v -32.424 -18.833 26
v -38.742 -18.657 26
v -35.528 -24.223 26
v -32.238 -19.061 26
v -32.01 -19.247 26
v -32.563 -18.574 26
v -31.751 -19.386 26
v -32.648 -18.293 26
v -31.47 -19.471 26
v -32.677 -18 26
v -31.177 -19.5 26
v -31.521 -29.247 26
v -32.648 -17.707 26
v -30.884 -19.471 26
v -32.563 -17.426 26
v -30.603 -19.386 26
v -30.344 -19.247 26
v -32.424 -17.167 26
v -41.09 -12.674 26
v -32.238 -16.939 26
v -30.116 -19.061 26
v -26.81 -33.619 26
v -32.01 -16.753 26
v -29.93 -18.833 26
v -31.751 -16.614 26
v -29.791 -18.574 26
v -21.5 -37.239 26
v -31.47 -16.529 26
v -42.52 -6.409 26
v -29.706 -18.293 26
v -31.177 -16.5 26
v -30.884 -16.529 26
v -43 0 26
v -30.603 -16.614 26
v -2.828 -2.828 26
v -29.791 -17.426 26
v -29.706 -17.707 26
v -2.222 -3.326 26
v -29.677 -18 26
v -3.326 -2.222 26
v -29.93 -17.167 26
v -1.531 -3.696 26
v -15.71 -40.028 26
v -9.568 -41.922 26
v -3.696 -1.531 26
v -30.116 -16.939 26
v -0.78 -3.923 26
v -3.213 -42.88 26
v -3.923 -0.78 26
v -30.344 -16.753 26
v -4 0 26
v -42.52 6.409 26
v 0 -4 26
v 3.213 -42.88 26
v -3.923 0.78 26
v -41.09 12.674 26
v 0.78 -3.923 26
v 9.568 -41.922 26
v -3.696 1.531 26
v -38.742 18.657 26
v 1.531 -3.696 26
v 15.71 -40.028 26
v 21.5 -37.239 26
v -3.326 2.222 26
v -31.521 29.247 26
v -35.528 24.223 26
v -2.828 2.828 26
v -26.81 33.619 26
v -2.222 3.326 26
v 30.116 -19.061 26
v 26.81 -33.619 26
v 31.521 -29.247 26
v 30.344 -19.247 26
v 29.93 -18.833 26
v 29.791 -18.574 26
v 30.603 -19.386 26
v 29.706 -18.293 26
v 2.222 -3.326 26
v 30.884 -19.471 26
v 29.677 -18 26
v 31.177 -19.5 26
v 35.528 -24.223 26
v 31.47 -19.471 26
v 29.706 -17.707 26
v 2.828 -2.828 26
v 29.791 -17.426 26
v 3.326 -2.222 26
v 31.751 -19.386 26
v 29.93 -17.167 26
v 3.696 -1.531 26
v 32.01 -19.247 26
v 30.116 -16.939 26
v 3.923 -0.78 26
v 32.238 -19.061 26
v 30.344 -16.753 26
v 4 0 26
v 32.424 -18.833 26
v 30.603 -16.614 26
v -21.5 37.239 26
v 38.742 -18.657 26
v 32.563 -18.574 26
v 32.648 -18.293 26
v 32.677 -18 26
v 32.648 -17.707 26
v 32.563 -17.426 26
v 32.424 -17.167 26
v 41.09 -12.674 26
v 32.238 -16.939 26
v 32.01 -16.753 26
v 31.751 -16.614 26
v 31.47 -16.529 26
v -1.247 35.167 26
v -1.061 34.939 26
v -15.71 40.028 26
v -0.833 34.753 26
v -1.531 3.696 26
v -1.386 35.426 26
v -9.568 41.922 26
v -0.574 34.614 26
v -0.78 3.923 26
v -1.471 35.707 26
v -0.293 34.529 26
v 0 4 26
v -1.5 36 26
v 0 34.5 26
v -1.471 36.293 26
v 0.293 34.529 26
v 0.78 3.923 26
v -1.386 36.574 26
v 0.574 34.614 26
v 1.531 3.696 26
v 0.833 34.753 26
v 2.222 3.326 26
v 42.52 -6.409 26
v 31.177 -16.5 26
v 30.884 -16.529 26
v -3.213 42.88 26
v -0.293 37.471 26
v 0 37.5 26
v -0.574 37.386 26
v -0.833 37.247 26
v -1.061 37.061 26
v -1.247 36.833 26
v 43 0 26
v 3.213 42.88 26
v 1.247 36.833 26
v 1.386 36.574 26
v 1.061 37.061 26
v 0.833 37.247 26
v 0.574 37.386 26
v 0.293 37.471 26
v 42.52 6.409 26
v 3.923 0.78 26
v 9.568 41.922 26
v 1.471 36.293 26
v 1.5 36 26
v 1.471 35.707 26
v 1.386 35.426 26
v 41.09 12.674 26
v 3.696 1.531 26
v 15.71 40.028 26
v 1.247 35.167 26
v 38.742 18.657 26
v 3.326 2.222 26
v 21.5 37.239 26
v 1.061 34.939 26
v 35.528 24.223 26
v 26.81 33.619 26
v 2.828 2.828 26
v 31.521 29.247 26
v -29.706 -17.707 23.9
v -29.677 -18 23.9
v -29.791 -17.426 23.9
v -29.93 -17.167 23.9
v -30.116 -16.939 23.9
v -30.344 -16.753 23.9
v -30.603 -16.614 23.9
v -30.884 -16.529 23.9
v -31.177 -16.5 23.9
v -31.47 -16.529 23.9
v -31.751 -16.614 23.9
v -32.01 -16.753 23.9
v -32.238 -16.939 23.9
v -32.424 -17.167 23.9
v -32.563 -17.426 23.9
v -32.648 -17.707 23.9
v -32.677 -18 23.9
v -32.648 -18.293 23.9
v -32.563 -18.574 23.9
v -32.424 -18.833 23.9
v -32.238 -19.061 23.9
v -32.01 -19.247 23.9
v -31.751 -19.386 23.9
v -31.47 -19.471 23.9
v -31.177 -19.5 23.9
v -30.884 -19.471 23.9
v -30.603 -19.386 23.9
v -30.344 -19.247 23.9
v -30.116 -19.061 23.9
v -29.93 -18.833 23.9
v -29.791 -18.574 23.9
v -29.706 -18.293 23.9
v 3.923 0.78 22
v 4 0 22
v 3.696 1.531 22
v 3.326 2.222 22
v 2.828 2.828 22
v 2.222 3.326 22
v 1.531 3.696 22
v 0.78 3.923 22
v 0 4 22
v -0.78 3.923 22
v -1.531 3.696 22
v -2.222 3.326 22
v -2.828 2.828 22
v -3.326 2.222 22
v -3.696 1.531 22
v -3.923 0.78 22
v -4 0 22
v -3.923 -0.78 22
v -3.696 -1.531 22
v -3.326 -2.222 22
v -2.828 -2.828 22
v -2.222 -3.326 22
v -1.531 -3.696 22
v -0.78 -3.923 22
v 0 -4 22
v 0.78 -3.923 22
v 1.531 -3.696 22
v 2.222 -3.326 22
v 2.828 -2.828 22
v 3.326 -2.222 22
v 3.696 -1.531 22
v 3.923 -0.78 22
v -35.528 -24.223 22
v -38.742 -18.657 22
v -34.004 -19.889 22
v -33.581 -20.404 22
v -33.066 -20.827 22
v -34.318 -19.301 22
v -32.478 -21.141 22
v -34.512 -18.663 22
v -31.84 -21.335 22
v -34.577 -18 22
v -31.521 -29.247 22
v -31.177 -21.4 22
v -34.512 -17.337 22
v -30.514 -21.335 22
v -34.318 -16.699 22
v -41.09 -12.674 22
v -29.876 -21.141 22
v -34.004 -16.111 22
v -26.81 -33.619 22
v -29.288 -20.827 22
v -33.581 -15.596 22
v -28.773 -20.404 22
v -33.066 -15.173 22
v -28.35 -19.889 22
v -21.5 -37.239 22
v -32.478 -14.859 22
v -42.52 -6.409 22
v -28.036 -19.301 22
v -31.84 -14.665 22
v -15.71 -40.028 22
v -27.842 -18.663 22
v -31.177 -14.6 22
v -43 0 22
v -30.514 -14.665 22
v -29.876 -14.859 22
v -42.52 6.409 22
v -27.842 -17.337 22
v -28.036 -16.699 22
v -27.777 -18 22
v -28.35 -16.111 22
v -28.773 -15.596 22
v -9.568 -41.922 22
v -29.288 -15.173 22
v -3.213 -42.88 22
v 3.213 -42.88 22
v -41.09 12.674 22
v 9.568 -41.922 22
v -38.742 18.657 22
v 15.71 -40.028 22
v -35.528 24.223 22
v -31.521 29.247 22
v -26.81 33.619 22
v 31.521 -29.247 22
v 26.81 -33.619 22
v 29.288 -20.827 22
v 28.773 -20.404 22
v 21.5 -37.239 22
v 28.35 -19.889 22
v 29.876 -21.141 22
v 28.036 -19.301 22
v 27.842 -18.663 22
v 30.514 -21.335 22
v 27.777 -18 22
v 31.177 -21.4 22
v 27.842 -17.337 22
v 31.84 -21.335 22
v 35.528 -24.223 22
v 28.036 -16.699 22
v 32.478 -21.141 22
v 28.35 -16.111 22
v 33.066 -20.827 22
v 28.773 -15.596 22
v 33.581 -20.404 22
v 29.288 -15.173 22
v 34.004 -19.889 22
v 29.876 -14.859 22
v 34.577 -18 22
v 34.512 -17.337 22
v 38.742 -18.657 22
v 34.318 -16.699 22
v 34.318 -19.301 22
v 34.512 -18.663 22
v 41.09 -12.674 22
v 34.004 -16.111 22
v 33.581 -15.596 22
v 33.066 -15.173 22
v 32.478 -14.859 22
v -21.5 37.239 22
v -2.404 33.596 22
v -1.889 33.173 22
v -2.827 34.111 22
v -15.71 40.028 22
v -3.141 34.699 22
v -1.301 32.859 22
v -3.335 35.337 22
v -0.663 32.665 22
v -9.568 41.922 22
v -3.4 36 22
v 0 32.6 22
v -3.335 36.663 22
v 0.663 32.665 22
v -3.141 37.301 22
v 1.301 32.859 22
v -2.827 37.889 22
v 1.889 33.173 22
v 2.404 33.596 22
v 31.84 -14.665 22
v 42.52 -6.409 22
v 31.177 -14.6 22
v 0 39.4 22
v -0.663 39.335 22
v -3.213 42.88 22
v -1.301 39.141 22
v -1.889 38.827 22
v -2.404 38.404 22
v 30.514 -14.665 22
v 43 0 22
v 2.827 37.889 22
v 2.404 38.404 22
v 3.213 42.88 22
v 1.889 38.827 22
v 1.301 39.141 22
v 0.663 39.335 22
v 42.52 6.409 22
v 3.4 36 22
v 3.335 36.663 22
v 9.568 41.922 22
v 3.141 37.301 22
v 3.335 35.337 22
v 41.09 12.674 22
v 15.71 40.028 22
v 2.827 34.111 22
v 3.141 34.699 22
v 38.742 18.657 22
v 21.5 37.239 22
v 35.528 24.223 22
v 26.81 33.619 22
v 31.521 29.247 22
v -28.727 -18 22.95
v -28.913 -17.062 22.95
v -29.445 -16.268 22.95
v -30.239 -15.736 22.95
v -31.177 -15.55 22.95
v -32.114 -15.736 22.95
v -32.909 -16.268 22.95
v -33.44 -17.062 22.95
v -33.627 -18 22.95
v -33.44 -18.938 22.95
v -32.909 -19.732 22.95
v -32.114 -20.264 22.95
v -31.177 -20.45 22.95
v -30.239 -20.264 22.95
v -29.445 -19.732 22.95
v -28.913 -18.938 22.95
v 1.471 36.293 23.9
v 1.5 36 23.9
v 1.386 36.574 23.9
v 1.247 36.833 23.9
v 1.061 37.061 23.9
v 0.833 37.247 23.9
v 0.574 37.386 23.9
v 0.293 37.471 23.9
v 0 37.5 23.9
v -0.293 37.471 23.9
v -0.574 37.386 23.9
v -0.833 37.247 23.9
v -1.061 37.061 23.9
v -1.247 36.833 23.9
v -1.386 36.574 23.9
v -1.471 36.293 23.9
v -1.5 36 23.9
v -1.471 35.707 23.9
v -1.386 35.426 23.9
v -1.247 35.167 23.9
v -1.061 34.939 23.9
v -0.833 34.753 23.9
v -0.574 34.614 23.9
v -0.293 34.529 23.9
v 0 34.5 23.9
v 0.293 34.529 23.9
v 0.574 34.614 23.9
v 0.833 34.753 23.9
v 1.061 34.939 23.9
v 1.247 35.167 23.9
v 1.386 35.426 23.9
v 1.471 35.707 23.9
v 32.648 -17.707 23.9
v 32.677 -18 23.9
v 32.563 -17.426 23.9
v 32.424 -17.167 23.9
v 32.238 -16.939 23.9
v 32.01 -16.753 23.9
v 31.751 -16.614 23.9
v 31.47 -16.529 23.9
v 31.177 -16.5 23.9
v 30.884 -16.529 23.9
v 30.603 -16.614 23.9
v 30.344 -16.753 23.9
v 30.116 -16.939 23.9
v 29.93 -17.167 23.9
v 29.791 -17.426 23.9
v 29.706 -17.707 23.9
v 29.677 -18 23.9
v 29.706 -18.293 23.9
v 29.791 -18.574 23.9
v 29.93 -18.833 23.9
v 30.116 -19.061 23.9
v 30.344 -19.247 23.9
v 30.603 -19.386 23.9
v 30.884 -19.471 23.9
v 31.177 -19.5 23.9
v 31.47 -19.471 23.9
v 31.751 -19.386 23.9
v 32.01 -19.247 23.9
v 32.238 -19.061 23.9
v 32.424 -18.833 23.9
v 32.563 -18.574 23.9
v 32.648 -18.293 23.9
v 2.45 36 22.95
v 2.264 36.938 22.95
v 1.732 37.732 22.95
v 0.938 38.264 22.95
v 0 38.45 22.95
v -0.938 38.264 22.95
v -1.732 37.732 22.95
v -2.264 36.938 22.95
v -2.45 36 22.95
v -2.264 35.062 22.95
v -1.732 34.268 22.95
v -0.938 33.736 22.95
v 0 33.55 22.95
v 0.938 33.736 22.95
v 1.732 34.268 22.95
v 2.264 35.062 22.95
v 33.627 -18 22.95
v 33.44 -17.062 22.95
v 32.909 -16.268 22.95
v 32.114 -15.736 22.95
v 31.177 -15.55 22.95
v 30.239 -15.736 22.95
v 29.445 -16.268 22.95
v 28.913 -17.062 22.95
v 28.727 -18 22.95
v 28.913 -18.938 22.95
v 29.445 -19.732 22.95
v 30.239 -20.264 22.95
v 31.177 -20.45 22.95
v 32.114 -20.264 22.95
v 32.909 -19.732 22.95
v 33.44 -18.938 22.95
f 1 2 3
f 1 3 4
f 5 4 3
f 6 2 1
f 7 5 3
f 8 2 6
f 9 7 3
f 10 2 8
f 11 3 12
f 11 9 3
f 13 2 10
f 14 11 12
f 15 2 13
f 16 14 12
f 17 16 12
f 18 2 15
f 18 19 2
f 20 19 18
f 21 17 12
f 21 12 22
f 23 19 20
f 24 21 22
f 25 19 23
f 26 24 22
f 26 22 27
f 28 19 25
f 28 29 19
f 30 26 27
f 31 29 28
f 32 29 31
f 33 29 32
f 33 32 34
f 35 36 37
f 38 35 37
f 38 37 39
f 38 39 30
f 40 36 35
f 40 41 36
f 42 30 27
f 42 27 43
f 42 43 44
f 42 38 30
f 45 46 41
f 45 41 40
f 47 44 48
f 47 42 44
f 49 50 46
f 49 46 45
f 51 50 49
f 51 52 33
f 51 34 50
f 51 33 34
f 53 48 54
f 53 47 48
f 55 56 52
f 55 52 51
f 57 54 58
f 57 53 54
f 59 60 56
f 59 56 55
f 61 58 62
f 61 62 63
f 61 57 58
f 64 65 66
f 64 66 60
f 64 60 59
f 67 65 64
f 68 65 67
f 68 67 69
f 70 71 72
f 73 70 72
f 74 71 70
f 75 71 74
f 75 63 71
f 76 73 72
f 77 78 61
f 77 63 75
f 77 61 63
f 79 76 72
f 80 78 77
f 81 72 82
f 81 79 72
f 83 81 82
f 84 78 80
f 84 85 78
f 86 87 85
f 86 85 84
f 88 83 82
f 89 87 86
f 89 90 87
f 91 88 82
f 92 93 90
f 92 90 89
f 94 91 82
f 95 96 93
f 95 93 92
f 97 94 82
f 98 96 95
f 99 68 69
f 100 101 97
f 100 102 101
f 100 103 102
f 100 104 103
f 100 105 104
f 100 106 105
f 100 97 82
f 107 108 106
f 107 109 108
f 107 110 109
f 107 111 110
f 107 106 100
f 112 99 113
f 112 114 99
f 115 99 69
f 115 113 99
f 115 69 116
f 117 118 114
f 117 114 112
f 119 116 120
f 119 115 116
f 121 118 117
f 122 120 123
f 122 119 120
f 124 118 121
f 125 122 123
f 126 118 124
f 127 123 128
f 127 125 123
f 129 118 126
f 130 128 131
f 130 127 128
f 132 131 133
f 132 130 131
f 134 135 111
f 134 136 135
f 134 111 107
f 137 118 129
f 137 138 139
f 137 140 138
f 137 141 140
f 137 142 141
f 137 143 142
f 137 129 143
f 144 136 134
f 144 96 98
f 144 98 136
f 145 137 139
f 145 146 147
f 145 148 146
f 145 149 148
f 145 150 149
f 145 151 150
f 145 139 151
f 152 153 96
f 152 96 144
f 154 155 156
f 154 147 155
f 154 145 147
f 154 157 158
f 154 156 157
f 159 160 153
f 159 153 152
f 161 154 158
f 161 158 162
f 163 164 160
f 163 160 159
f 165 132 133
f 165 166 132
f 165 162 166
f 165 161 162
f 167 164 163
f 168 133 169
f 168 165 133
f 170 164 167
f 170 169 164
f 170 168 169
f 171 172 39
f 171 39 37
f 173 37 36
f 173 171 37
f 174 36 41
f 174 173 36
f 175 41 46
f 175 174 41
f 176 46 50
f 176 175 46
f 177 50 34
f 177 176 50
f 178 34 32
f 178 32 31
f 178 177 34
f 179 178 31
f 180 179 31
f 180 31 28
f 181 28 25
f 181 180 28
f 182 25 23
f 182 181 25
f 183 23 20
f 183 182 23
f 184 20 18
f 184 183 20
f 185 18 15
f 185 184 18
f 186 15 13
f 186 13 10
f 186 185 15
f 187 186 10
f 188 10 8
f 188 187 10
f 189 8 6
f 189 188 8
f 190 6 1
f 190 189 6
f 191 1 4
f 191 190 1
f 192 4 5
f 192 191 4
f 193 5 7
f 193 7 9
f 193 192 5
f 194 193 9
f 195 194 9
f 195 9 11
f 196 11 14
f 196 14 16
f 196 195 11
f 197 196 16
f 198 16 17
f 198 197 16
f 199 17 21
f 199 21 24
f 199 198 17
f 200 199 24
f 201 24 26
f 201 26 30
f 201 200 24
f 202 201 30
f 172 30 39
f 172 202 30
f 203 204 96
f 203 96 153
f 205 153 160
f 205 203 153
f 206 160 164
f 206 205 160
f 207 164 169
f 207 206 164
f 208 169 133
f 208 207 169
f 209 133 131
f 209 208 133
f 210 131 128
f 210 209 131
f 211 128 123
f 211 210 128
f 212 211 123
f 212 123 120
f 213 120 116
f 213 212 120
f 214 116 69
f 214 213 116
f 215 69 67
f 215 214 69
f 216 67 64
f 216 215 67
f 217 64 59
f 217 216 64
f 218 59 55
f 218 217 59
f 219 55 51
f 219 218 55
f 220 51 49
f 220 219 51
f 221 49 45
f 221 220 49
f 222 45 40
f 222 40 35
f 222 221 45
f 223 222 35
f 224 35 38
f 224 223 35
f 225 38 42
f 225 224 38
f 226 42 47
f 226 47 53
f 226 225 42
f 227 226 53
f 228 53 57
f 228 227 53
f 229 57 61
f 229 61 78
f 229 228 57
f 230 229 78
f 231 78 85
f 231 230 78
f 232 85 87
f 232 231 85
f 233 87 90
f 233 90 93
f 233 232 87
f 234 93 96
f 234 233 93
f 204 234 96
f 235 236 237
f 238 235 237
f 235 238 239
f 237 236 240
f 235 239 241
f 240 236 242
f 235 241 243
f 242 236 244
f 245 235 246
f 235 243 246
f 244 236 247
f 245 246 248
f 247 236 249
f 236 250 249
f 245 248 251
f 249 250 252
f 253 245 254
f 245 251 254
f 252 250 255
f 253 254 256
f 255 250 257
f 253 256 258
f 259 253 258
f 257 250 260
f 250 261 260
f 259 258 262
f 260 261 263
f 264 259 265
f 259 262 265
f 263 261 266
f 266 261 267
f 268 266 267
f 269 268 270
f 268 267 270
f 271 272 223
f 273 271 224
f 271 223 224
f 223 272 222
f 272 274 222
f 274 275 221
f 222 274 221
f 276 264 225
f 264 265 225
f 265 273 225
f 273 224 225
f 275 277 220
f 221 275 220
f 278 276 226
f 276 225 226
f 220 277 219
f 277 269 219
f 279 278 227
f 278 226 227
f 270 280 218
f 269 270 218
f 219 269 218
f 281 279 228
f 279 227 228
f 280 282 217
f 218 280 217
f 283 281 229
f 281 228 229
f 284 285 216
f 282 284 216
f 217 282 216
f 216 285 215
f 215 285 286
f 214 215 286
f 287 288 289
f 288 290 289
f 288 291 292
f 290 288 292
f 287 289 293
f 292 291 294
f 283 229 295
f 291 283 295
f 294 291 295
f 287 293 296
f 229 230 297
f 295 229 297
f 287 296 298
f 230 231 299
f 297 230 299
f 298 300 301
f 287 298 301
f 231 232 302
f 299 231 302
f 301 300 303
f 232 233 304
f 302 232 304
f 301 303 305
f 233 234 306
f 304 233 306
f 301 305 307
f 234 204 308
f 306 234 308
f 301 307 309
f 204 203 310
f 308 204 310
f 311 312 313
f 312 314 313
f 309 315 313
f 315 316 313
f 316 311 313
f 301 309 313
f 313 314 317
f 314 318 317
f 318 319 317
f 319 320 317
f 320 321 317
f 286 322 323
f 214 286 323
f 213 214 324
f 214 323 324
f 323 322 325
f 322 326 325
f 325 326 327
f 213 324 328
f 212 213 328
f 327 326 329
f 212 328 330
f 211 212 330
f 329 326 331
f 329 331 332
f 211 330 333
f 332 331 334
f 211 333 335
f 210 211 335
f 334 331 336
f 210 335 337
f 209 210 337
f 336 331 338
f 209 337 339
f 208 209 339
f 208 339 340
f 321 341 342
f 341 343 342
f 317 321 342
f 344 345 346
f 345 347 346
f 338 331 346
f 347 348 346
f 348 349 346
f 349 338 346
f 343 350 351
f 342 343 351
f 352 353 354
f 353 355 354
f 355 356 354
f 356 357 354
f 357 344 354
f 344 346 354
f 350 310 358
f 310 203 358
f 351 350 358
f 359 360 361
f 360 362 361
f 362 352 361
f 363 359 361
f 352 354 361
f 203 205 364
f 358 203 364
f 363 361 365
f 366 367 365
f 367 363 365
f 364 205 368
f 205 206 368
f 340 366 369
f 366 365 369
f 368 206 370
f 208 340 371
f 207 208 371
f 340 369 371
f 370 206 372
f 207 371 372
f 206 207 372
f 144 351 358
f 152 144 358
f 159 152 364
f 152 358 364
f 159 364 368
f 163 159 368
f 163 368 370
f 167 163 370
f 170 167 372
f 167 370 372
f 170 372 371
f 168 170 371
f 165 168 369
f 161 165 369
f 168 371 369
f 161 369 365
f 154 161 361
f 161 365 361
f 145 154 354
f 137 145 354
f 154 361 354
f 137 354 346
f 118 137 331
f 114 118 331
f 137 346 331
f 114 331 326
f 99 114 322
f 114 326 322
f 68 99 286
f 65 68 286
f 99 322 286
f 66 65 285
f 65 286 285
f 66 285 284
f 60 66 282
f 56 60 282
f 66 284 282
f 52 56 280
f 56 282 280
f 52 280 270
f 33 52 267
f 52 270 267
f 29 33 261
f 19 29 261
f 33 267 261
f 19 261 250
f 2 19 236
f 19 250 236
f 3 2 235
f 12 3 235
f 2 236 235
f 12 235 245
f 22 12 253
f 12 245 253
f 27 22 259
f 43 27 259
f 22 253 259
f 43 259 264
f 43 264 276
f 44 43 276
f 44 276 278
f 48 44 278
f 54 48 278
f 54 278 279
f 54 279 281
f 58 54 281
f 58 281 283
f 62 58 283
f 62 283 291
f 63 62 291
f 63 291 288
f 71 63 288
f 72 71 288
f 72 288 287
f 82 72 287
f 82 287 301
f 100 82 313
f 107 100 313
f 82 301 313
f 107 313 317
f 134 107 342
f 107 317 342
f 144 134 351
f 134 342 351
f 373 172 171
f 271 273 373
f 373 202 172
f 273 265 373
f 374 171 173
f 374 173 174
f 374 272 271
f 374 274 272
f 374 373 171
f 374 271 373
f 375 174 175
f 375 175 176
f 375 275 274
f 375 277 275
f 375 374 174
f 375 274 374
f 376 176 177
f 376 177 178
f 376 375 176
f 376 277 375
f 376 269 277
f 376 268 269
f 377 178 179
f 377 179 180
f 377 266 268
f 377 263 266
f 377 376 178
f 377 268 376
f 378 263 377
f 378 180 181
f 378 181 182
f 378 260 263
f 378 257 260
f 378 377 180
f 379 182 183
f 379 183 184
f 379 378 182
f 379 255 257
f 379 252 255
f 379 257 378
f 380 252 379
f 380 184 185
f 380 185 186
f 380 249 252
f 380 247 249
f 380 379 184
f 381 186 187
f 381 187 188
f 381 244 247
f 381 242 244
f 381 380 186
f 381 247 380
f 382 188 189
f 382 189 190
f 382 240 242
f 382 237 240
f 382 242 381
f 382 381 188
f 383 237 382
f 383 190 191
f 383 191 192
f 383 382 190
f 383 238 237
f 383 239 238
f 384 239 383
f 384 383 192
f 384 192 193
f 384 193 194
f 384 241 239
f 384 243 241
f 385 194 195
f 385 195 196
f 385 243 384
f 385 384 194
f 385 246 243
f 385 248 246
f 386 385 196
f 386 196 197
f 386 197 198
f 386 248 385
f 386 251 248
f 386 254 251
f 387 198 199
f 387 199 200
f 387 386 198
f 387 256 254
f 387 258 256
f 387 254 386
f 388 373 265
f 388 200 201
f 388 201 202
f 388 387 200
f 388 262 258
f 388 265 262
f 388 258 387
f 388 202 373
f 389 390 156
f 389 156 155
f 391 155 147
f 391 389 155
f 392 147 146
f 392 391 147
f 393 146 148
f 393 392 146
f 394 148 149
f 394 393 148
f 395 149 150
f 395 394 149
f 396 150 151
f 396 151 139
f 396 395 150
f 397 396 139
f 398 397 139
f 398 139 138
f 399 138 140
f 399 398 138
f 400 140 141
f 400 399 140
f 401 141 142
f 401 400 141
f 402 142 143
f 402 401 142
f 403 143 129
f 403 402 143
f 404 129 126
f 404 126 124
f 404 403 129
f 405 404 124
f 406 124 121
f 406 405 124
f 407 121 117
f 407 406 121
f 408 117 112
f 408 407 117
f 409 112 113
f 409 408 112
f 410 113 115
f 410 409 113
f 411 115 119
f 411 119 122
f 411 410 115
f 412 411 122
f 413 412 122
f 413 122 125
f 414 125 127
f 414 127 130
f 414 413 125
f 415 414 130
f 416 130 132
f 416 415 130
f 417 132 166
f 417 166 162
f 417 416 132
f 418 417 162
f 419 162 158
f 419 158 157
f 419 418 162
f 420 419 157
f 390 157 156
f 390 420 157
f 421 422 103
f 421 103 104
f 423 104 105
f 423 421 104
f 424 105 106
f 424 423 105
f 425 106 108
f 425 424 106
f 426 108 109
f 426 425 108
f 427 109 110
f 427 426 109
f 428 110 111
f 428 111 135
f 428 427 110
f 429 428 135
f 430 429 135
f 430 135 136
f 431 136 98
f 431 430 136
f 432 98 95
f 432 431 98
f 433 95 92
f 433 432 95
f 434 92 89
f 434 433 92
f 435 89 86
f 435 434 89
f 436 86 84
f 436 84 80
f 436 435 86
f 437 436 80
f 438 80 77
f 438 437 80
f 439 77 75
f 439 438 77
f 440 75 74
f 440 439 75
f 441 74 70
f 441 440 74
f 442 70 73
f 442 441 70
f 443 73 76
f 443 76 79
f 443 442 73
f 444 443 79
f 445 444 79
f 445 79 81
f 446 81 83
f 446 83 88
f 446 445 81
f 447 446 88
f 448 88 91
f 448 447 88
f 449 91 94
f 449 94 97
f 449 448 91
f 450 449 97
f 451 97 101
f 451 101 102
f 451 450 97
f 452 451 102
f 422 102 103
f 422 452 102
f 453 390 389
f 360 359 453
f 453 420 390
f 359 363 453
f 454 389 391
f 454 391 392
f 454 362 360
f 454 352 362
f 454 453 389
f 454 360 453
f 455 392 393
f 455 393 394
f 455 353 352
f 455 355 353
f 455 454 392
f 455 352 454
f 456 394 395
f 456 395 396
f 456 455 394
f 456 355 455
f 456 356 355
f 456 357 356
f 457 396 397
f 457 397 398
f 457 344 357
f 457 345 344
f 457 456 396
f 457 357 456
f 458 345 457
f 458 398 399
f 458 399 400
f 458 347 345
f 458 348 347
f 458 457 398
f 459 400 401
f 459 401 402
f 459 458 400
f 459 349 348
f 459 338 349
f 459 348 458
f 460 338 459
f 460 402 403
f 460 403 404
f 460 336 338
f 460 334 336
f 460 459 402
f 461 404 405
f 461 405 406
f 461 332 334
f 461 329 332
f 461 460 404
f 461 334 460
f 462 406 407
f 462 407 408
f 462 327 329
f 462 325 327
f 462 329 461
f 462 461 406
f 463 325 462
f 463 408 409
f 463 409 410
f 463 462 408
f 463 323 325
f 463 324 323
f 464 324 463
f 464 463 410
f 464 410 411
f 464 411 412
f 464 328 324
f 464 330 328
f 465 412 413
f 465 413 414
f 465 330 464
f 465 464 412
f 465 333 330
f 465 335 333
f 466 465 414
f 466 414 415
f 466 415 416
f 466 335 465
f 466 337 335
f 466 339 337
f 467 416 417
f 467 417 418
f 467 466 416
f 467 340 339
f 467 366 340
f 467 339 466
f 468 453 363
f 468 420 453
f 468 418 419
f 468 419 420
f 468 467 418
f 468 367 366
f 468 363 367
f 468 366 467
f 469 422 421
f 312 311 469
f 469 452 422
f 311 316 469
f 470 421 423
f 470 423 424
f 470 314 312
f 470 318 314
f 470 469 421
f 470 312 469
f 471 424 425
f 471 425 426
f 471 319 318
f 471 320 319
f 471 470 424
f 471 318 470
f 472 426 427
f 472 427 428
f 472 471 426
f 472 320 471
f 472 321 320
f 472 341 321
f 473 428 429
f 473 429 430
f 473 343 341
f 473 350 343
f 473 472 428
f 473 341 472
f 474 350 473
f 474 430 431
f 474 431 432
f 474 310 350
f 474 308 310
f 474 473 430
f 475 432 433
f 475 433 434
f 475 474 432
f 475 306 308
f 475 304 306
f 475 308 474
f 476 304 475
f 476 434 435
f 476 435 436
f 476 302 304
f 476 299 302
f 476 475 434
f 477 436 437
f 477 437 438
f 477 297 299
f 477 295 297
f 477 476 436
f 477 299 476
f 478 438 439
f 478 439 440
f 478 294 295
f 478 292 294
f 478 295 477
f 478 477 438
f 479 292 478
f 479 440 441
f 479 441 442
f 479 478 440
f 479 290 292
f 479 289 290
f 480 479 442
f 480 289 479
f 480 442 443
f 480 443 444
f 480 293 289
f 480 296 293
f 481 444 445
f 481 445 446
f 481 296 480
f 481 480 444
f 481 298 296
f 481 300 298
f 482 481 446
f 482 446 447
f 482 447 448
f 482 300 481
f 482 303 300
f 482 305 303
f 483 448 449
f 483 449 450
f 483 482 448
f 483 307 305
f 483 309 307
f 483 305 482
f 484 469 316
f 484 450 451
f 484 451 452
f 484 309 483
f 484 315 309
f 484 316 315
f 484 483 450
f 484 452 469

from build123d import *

# Parameters (mm, degrees)
SKETCH006_R     = 43
SKETCH006_R_2   = 1.5
SKETCH006_R_3   = 4
PAD_DEPTH       = 4
CHAMFER001_SIZE = 1.9


with BuildPart() as part:
    # Sketch006 → Pad (new body)
    with BuildSketch(Plane.XY.offset(22)):
        Circle(SKETCH006_R)
        with Locations((0, 36)):
            Circle(SKETCH006_R_2, mode=Mode.SUBTRACT)
        with Locations((31.176915, -18)):
            Circle(SKETCH006_R_2, mode=Mode.SUBTRACT)
        with Locations((-31.176915, -18)):
            Circle(SKETCH006_R_2, mode=Mode.SUBTRACT)
        Circle(SKETCH006_R_3, mode=Mode.SUBTRACT)
    extrude(amount=PAD_DEPTH)

    # Chamfer001
    chamfer001_edges = [part.edges().sort_by_distance(p)[0] for p in [
        (-32.676915, -18, 22),
        (29.676915, -18, 22),
        (-1.5, 36, 22),
    ]]
    chamfer(chamfer001_edges, length=CHAMFER001_SIZE)


solid = part.part
